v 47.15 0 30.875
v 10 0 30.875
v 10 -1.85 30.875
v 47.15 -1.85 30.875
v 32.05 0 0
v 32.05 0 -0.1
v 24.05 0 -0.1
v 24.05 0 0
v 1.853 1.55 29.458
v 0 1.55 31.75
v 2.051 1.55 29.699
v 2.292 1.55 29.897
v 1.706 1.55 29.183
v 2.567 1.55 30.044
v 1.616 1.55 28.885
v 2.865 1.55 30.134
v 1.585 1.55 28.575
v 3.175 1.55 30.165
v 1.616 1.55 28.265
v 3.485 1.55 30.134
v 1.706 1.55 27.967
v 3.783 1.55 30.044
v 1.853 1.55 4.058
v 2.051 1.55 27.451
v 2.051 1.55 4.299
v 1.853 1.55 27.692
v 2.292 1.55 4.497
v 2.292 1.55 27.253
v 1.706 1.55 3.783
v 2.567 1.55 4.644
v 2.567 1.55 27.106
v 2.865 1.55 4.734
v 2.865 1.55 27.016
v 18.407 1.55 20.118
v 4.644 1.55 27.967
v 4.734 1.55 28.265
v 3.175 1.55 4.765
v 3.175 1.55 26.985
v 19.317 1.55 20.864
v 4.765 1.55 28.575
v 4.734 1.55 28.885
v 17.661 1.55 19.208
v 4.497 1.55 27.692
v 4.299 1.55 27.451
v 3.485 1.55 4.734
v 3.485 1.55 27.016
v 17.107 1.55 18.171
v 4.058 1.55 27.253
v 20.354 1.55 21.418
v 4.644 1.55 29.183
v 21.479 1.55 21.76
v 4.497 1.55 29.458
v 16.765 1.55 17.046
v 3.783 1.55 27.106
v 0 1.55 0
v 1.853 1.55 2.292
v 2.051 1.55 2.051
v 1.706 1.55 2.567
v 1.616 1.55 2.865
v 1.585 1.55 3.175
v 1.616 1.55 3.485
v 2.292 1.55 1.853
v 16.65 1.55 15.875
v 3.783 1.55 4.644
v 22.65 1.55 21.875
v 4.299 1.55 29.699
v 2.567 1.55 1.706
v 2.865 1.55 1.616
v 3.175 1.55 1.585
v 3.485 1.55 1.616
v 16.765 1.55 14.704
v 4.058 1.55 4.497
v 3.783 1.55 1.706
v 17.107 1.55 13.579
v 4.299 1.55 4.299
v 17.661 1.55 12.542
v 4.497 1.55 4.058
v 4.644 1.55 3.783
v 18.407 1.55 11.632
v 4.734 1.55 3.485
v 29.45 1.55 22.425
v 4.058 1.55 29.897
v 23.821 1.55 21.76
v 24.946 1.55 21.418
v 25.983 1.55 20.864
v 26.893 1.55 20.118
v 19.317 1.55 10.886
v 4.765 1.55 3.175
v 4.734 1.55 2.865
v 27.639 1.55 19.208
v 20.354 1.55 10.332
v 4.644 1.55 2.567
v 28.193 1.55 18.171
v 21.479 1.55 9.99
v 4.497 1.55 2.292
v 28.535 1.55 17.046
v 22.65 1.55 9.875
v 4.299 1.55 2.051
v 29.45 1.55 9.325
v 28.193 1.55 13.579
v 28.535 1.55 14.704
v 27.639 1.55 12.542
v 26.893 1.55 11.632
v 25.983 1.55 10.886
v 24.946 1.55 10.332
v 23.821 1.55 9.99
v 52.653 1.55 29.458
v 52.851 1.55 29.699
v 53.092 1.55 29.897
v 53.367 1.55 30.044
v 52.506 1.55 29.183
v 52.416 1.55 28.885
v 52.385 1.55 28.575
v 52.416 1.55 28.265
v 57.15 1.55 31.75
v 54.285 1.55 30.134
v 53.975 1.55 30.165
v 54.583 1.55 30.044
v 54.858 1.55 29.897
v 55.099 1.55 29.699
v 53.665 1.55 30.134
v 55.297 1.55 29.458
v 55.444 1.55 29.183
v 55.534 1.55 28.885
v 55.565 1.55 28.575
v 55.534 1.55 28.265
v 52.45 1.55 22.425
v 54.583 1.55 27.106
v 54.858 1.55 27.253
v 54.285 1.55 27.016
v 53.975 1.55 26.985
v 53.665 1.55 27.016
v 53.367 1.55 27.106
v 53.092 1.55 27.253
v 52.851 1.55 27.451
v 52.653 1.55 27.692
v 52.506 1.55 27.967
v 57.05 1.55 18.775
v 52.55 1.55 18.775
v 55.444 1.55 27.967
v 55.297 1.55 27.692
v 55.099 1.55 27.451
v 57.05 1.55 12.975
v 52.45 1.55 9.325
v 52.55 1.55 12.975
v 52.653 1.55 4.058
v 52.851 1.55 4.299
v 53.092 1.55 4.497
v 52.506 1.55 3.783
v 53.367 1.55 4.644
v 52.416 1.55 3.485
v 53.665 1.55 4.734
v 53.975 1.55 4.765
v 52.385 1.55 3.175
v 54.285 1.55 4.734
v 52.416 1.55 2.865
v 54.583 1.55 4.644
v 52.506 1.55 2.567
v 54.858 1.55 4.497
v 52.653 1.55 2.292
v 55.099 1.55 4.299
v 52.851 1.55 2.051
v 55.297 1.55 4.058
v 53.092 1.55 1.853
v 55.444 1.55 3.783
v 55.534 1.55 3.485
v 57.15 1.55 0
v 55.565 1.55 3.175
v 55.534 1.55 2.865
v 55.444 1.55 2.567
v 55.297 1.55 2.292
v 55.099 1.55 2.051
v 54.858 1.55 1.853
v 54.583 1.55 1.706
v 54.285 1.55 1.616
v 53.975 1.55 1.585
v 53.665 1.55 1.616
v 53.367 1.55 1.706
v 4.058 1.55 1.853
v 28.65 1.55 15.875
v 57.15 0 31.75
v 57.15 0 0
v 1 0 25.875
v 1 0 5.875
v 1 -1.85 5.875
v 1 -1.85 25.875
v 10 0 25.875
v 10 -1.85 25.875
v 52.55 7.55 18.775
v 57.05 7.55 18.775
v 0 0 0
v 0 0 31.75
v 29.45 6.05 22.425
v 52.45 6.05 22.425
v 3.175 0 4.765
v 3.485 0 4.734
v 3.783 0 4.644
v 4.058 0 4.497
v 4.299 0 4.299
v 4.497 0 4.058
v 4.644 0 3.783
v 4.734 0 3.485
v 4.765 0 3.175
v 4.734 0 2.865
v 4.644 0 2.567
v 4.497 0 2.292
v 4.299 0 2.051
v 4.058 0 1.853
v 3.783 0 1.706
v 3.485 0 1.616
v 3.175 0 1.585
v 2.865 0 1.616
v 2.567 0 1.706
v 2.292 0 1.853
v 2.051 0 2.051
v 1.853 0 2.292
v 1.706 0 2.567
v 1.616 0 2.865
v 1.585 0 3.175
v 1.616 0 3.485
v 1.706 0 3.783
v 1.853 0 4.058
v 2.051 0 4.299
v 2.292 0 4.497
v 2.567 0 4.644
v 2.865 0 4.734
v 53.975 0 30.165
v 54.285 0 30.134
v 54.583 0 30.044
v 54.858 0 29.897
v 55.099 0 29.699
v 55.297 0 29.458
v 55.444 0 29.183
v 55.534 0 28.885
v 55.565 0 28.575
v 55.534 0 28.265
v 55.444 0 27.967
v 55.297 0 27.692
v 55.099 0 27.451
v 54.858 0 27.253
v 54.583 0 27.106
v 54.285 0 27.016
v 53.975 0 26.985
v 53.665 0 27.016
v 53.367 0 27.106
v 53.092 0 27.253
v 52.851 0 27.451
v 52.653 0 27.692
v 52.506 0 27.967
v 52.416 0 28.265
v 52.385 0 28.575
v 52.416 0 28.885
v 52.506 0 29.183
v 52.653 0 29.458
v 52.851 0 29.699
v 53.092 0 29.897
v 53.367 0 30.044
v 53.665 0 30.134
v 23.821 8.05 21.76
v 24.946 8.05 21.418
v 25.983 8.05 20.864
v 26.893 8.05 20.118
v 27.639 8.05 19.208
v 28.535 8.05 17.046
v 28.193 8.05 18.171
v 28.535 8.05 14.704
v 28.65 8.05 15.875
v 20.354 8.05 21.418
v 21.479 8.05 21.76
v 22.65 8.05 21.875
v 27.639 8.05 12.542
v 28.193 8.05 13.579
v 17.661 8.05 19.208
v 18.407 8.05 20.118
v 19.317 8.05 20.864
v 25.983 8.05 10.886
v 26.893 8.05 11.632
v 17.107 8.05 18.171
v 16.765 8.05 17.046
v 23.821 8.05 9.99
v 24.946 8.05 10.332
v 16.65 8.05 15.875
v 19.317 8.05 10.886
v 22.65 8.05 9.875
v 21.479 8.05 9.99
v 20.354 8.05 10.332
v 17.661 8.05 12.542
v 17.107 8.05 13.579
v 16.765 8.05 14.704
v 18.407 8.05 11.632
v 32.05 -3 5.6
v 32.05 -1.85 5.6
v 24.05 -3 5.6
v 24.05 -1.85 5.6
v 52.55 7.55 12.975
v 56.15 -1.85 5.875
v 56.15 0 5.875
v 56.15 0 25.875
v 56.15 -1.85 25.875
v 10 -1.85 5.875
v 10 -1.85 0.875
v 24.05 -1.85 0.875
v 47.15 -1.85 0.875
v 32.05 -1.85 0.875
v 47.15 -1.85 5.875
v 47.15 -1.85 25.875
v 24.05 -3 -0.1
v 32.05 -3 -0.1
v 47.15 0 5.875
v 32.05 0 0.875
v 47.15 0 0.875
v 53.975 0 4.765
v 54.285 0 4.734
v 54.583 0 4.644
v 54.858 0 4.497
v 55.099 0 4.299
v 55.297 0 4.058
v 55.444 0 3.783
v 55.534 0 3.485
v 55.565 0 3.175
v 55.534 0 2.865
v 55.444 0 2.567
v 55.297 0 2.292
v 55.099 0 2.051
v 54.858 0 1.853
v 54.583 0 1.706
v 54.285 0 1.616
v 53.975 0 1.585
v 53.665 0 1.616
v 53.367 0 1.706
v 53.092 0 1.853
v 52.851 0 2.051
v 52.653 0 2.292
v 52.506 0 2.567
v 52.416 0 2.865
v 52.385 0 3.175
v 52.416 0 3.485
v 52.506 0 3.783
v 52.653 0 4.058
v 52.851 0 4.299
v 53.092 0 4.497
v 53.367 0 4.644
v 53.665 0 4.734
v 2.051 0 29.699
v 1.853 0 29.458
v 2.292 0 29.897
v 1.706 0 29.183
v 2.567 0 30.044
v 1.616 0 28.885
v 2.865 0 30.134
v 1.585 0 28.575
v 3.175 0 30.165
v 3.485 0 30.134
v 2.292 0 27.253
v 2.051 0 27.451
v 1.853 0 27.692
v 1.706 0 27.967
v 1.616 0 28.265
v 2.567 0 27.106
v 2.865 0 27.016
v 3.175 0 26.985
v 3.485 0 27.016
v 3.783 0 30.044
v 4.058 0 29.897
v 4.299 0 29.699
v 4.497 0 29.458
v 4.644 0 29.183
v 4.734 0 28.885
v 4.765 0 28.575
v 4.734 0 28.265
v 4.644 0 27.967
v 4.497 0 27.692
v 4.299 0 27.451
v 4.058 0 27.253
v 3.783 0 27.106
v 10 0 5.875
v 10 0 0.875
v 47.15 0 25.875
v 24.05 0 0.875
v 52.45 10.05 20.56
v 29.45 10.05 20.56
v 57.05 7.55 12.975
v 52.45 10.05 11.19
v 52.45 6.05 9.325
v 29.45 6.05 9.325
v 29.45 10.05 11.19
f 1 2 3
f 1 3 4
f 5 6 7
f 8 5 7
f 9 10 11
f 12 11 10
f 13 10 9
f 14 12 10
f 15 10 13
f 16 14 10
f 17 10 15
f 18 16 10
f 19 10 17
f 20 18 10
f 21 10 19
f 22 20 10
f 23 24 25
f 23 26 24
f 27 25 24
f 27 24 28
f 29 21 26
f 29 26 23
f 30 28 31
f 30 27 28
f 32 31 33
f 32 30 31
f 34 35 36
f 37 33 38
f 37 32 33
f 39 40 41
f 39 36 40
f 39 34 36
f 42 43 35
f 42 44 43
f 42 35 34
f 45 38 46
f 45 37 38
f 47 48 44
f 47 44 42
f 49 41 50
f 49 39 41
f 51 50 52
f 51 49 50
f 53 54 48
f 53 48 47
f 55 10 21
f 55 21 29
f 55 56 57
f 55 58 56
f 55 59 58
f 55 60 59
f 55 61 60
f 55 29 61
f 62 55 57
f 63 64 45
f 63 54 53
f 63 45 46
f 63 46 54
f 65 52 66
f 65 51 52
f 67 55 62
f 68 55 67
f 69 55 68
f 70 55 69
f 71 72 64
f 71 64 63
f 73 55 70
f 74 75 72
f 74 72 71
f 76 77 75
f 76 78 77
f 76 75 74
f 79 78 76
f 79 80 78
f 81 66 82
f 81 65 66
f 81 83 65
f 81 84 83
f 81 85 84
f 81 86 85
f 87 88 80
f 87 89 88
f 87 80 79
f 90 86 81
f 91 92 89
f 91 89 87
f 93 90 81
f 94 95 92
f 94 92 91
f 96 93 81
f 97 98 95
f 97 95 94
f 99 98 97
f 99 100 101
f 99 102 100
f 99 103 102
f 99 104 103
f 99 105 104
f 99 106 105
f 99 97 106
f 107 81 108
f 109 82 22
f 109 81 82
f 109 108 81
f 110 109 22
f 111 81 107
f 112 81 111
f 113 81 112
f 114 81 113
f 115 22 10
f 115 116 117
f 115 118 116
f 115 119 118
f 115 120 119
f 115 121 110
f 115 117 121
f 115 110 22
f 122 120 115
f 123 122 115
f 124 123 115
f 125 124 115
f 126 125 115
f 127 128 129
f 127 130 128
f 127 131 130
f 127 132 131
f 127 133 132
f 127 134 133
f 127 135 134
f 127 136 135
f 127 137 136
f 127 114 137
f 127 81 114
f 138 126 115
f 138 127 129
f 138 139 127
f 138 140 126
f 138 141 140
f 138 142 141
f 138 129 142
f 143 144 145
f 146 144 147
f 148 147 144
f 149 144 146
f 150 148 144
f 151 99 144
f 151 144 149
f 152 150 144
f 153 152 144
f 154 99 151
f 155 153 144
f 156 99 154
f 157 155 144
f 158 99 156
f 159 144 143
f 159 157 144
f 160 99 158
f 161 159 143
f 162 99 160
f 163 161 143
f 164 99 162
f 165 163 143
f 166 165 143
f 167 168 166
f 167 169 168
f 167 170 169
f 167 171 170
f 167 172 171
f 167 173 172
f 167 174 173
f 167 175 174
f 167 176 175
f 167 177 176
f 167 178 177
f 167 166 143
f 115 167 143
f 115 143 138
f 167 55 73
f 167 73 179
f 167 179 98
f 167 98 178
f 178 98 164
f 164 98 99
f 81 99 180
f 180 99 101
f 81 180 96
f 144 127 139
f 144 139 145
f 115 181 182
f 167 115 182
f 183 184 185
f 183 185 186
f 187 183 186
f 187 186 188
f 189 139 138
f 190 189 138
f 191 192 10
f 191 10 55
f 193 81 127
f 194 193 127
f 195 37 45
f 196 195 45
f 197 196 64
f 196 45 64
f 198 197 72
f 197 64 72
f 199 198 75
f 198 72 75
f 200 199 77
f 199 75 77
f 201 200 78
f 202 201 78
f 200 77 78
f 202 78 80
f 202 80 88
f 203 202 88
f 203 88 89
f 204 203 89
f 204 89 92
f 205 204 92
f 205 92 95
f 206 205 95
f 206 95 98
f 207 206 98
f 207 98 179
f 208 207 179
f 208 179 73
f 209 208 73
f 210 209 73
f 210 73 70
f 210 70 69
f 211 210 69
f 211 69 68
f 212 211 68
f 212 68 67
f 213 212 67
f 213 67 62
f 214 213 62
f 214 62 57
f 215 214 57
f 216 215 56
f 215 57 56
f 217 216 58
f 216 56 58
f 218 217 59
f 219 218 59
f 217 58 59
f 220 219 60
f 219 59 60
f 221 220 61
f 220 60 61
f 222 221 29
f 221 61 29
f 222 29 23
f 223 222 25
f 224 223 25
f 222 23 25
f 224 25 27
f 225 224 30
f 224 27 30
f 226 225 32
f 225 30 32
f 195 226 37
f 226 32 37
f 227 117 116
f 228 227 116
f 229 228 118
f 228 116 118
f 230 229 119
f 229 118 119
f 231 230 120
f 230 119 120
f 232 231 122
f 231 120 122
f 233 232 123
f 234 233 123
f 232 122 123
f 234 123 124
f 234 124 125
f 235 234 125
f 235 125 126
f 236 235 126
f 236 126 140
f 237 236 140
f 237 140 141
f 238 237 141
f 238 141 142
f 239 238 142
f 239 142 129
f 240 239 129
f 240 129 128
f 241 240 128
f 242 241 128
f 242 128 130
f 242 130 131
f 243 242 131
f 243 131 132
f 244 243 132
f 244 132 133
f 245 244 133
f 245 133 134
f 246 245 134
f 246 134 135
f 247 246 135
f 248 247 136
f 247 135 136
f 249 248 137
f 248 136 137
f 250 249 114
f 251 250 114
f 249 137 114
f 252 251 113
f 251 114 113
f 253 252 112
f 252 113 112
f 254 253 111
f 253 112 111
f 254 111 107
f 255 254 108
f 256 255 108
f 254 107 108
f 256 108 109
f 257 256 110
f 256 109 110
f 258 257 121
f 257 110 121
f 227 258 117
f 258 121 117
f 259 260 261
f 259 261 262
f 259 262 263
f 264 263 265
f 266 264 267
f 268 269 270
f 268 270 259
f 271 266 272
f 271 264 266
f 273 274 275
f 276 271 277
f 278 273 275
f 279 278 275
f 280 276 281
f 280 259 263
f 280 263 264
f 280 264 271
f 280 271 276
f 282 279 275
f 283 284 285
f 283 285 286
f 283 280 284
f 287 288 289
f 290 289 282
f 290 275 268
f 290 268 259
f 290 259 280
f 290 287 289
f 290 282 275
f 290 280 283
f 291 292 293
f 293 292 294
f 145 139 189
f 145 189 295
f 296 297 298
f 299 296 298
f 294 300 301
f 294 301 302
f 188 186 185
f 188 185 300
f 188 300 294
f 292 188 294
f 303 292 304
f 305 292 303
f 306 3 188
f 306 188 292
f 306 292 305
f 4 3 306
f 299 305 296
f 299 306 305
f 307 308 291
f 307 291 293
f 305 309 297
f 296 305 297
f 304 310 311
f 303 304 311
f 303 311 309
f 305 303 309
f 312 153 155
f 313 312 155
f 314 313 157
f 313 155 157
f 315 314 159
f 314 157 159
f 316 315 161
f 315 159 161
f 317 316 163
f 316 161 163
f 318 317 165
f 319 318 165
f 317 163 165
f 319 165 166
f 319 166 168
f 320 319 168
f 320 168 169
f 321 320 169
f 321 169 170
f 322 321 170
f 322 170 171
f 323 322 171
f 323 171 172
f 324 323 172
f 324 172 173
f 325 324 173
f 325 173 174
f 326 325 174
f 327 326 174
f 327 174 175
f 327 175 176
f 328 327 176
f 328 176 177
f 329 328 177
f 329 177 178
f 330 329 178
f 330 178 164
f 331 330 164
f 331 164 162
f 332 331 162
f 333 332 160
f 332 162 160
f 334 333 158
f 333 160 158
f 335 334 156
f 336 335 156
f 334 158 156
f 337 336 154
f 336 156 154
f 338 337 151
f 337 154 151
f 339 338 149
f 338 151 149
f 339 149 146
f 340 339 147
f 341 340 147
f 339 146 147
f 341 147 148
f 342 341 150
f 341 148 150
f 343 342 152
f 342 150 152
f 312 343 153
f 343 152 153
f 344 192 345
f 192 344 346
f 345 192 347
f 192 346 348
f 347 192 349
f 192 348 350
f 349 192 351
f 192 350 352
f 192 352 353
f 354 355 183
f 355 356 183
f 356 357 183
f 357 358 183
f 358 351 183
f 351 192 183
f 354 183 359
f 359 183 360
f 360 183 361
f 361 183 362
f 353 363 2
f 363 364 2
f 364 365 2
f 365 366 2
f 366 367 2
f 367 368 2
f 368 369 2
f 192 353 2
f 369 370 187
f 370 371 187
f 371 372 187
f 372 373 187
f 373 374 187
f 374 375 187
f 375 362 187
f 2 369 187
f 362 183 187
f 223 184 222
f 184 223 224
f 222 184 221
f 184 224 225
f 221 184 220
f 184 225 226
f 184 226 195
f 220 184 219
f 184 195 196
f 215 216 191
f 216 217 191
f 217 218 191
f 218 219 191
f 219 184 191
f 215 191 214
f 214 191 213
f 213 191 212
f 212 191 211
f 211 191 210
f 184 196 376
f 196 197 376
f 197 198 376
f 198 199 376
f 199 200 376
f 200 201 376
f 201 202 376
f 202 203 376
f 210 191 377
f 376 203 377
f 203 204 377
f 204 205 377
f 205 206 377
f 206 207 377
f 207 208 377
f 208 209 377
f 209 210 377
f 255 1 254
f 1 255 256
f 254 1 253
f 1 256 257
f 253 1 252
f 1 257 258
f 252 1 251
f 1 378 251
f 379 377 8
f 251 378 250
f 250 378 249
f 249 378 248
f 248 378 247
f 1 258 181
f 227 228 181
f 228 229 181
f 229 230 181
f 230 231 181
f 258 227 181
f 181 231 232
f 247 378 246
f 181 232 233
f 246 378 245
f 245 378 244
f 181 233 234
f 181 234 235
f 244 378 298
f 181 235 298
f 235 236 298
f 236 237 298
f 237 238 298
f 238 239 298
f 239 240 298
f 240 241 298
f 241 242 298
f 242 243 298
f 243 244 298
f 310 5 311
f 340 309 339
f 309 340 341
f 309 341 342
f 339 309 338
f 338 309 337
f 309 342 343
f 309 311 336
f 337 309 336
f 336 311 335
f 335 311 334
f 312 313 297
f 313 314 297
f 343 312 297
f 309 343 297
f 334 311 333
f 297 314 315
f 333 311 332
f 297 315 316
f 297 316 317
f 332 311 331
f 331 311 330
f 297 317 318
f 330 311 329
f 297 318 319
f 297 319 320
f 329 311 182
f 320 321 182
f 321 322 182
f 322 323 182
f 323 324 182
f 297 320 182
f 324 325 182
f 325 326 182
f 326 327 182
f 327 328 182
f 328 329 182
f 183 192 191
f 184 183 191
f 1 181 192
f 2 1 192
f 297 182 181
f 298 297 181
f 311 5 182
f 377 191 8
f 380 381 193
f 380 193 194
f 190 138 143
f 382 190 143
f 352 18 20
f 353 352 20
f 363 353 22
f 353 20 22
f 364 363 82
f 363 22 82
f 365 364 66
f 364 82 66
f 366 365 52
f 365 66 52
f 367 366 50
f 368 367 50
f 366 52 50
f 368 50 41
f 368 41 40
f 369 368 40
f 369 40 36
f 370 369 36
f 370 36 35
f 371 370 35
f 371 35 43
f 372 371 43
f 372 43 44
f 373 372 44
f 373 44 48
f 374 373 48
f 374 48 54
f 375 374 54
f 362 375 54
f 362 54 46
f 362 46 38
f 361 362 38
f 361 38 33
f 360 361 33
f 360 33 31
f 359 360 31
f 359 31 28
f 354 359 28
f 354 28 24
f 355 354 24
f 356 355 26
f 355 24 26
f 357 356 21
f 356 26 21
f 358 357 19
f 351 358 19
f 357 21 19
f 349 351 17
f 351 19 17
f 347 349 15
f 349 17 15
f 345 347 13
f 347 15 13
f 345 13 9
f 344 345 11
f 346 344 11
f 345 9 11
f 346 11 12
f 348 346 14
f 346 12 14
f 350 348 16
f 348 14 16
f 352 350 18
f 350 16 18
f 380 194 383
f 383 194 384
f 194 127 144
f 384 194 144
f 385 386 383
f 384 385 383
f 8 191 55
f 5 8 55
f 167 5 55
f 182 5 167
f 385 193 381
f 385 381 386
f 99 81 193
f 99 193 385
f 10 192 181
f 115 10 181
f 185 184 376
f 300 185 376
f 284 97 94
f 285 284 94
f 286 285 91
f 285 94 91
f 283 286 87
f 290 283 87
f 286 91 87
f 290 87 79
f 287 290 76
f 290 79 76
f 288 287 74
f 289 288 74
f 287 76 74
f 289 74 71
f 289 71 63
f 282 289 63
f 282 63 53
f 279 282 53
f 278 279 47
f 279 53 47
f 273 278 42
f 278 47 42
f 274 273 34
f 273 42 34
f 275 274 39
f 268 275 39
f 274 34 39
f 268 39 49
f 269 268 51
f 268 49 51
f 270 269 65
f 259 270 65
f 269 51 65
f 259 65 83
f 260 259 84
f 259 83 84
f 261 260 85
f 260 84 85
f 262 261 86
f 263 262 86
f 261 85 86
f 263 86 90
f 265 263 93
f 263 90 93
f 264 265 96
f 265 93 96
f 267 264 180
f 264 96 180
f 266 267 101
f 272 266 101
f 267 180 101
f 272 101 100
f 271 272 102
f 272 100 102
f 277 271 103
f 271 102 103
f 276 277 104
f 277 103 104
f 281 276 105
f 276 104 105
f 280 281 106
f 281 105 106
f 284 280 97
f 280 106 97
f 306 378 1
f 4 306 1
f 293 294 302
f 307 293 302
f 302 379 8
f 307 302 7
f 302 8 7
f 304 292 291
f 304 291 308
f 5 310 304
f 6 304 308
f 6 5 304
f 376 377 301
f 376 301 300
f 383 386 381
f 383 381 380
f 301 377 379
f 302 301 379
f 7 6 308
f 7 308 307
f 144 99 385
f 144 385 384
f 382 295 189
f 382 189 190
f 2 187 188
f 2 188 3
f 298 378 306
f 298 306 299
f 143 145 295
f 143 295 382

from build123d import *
from OCP.BRepFilletAPI import BRepFilletAPI_MakeChamfer

# Parameters (mm, degrees)
SKETCH1_W                = 57.15
SKETCH1_H                = 31.75
PCB_DEPTH                = 1.55
SKETCH2_R                = 1.59
MOUNT_HOLES_DEPTH        = 66.395622942
SKETCH4_R                = 6
SPEAKER_DEPTH            = 6.5
SKETCH5_W                = 23
SKETCH5_H                = 13.1
TERMINALS_DEPTH          = 8.5
CHAMFER1_SIZE            = 4
CHAMFER1_SIZE2           = 1.865230633
SKETCH7_W                = 4.5
SKETCH7_H                = 5.8
BATTERY_PORT_DEPTH       = 6
SKETCH11_W               = 8
SKETCH11_H               = 5.7
USB_PORT_DEPTH           = 3
SKETCH14_W               = 9
SKETCH14_H               = 20
SKETCH14_W_2             = 37.15
SKETCH14_H_2             = 30
SURFACE_COMPONENTS_DEPTH = 1.85


with BuildPart() as part:
    # Sketch1 → PCB (new body)
    with BuildSketch(Plane(origin=(0, 0, 0), x_dir=(1, 0, 0), z_dir=(0, 1, 0))):
        with Locations((28.575, -15.875)):
            Rectangle(SKETCH1_W, SKETCH1_H)
    extrude(amount=PCB_DEPTH)

    # Sketch2 → Mount Holes (cut, through all)
    with BuildSketch(Plane(origin=(0, 1.55, 0), x_dir=(1, 0, 0), z_dir=(0, 1, 0))):
        with Locations(Location((3.175, -3.175, 0), (0, 0, 270))):
            Circle(SKETCH2_R)
        with Locations(Location((3.175, -28.575, 0), (0, 0, 270))):
            Circle(SKETCH2_R)
        with Locations(Location((53.975, -28.575, 0), (0, 0, 270))):
            Circle(SKETCH2_R)
        with Locations(Location((53.975, -3.175, 0), (0, 0, 270))):
            Circle(SKETCH2_R)
    extrude(amount=-MOUNT_HOLES_DEPTH, mode=Mode.SUBTRACT)

    # Sketch4 → Speaker (add)
    with BuildSketch(Plane(origin=(0, 1.55, 0), x_dir=(1, 0, 0), z_dir=(0, 1, 0))):
        with Locations(Location((22.65, -15.875, 0), (0, 0, 90))):
            Circle(SKETCH4_R)
    extrude(amount=SPEAKER_DEPTH)

    # Sketch5 → Terminals (add)
    with BuildSketch(Plane(origin=(0, 1.55, 0), x_dir=(1, 0, 0), z_dir=(0, 1, 0))):
        with Locations((40.95, -15.875)):
            Rectangle(SKETCH5_W, SKETCH5_H)
    extrude(amount=TERMINALS_DEPTH)

    # Chamfer1: one chamfer whose edges measure the first distance from different faces: ONE call of the kernel's chamfer builder (chamfer() names one face for all edges)
    chamfer1_edges_1 = [part.edges().sort_by_distance(p)[0] for p in [
        (40.95, 10.05, 22.425),
    ]]
    chamfer1_side_1 = [part.faces().sort_by_distance(p)[0] for p in [
        (40.95, 5.8, 22.425),
    ]]
    chamfer1_edges_2 = [part.edges().sort_by_distance(p)[0] for p in [
        (40.95, 10.05, 9.325),
    ]]
    chamfer1_side_2 = [part.faces().sort_by_distance(p)[0] for p in [
        (40.95, 5.8, 9.325),
    ]]
    chamfer1 = BRepFilletAPI_MakeChamfer(part.part.solid().wrapped)
    for e in chamfer1_edges_1:
        chamfer1.Add(CHAMFER1_SIZE, CHAMFER1_SIZE2, e.wrapped, chamfer1_side_1[0].wrapped)  # the first distance lies on this face
    for e in chamfer1_edges_2:
        chamfer1.Add(CHAMFER1_SIZE, CHAMFER1_SIZE2, e.wrapped, chamfer1_side_2[0].wrapped)  # the first distance lies on this face
    add(Compound.cast(chamfer1.Shape()), mode=Mode.REPLACE)

    # Sketch7 → Battery Port (add)
    with BuildSketch(Plane(origin=(0, 1.55, 0), x_dir=(1, 0, 0), z_dir=(0, 1, 0))):
        with Locations((54.8, -15.875)):
            Rectangle(SKETCH7_W, SKETCH7_H)
    extrude(amount=BATTERY_PORT_DEPTH)



with BuildPart() as body_2:
    # Sketch11 → USB Port (new body)
    with BuildSketch(Plane(origin=(0, 0, 0), x_dir=(-1, 0, 0), z_dir=(0, -1, 0))):
        with Locations((-28.05, -2.75)):
            Rectangle(SKETCH11_W, SKETCH11_H)
    extrude(amount=USB_PORT_DEPTH)


with BuildPart() as part_1:
    add(part.part)

    add(body_2.part)  # Surface Components merges body 2
    # Sketch14 → Surface Components (add)
    with BuildSketch(Plane.XZ):
        with Locations((5.5, 15.875)):
            Rectangle(SKETCH14_W, SKETCH14_H)
        with Locations((28.575, 15.875)):
            Rectangle(SKETCH14_W_2, SKETCH14_H_2)
        with Locations((51.65, 15.875)):
            Rectangle(SKETCH14_W, SKETCH14_H)
    extrude(amount=SURFACE_COMPONENTS_DEPTH)


solid = part_1.part
